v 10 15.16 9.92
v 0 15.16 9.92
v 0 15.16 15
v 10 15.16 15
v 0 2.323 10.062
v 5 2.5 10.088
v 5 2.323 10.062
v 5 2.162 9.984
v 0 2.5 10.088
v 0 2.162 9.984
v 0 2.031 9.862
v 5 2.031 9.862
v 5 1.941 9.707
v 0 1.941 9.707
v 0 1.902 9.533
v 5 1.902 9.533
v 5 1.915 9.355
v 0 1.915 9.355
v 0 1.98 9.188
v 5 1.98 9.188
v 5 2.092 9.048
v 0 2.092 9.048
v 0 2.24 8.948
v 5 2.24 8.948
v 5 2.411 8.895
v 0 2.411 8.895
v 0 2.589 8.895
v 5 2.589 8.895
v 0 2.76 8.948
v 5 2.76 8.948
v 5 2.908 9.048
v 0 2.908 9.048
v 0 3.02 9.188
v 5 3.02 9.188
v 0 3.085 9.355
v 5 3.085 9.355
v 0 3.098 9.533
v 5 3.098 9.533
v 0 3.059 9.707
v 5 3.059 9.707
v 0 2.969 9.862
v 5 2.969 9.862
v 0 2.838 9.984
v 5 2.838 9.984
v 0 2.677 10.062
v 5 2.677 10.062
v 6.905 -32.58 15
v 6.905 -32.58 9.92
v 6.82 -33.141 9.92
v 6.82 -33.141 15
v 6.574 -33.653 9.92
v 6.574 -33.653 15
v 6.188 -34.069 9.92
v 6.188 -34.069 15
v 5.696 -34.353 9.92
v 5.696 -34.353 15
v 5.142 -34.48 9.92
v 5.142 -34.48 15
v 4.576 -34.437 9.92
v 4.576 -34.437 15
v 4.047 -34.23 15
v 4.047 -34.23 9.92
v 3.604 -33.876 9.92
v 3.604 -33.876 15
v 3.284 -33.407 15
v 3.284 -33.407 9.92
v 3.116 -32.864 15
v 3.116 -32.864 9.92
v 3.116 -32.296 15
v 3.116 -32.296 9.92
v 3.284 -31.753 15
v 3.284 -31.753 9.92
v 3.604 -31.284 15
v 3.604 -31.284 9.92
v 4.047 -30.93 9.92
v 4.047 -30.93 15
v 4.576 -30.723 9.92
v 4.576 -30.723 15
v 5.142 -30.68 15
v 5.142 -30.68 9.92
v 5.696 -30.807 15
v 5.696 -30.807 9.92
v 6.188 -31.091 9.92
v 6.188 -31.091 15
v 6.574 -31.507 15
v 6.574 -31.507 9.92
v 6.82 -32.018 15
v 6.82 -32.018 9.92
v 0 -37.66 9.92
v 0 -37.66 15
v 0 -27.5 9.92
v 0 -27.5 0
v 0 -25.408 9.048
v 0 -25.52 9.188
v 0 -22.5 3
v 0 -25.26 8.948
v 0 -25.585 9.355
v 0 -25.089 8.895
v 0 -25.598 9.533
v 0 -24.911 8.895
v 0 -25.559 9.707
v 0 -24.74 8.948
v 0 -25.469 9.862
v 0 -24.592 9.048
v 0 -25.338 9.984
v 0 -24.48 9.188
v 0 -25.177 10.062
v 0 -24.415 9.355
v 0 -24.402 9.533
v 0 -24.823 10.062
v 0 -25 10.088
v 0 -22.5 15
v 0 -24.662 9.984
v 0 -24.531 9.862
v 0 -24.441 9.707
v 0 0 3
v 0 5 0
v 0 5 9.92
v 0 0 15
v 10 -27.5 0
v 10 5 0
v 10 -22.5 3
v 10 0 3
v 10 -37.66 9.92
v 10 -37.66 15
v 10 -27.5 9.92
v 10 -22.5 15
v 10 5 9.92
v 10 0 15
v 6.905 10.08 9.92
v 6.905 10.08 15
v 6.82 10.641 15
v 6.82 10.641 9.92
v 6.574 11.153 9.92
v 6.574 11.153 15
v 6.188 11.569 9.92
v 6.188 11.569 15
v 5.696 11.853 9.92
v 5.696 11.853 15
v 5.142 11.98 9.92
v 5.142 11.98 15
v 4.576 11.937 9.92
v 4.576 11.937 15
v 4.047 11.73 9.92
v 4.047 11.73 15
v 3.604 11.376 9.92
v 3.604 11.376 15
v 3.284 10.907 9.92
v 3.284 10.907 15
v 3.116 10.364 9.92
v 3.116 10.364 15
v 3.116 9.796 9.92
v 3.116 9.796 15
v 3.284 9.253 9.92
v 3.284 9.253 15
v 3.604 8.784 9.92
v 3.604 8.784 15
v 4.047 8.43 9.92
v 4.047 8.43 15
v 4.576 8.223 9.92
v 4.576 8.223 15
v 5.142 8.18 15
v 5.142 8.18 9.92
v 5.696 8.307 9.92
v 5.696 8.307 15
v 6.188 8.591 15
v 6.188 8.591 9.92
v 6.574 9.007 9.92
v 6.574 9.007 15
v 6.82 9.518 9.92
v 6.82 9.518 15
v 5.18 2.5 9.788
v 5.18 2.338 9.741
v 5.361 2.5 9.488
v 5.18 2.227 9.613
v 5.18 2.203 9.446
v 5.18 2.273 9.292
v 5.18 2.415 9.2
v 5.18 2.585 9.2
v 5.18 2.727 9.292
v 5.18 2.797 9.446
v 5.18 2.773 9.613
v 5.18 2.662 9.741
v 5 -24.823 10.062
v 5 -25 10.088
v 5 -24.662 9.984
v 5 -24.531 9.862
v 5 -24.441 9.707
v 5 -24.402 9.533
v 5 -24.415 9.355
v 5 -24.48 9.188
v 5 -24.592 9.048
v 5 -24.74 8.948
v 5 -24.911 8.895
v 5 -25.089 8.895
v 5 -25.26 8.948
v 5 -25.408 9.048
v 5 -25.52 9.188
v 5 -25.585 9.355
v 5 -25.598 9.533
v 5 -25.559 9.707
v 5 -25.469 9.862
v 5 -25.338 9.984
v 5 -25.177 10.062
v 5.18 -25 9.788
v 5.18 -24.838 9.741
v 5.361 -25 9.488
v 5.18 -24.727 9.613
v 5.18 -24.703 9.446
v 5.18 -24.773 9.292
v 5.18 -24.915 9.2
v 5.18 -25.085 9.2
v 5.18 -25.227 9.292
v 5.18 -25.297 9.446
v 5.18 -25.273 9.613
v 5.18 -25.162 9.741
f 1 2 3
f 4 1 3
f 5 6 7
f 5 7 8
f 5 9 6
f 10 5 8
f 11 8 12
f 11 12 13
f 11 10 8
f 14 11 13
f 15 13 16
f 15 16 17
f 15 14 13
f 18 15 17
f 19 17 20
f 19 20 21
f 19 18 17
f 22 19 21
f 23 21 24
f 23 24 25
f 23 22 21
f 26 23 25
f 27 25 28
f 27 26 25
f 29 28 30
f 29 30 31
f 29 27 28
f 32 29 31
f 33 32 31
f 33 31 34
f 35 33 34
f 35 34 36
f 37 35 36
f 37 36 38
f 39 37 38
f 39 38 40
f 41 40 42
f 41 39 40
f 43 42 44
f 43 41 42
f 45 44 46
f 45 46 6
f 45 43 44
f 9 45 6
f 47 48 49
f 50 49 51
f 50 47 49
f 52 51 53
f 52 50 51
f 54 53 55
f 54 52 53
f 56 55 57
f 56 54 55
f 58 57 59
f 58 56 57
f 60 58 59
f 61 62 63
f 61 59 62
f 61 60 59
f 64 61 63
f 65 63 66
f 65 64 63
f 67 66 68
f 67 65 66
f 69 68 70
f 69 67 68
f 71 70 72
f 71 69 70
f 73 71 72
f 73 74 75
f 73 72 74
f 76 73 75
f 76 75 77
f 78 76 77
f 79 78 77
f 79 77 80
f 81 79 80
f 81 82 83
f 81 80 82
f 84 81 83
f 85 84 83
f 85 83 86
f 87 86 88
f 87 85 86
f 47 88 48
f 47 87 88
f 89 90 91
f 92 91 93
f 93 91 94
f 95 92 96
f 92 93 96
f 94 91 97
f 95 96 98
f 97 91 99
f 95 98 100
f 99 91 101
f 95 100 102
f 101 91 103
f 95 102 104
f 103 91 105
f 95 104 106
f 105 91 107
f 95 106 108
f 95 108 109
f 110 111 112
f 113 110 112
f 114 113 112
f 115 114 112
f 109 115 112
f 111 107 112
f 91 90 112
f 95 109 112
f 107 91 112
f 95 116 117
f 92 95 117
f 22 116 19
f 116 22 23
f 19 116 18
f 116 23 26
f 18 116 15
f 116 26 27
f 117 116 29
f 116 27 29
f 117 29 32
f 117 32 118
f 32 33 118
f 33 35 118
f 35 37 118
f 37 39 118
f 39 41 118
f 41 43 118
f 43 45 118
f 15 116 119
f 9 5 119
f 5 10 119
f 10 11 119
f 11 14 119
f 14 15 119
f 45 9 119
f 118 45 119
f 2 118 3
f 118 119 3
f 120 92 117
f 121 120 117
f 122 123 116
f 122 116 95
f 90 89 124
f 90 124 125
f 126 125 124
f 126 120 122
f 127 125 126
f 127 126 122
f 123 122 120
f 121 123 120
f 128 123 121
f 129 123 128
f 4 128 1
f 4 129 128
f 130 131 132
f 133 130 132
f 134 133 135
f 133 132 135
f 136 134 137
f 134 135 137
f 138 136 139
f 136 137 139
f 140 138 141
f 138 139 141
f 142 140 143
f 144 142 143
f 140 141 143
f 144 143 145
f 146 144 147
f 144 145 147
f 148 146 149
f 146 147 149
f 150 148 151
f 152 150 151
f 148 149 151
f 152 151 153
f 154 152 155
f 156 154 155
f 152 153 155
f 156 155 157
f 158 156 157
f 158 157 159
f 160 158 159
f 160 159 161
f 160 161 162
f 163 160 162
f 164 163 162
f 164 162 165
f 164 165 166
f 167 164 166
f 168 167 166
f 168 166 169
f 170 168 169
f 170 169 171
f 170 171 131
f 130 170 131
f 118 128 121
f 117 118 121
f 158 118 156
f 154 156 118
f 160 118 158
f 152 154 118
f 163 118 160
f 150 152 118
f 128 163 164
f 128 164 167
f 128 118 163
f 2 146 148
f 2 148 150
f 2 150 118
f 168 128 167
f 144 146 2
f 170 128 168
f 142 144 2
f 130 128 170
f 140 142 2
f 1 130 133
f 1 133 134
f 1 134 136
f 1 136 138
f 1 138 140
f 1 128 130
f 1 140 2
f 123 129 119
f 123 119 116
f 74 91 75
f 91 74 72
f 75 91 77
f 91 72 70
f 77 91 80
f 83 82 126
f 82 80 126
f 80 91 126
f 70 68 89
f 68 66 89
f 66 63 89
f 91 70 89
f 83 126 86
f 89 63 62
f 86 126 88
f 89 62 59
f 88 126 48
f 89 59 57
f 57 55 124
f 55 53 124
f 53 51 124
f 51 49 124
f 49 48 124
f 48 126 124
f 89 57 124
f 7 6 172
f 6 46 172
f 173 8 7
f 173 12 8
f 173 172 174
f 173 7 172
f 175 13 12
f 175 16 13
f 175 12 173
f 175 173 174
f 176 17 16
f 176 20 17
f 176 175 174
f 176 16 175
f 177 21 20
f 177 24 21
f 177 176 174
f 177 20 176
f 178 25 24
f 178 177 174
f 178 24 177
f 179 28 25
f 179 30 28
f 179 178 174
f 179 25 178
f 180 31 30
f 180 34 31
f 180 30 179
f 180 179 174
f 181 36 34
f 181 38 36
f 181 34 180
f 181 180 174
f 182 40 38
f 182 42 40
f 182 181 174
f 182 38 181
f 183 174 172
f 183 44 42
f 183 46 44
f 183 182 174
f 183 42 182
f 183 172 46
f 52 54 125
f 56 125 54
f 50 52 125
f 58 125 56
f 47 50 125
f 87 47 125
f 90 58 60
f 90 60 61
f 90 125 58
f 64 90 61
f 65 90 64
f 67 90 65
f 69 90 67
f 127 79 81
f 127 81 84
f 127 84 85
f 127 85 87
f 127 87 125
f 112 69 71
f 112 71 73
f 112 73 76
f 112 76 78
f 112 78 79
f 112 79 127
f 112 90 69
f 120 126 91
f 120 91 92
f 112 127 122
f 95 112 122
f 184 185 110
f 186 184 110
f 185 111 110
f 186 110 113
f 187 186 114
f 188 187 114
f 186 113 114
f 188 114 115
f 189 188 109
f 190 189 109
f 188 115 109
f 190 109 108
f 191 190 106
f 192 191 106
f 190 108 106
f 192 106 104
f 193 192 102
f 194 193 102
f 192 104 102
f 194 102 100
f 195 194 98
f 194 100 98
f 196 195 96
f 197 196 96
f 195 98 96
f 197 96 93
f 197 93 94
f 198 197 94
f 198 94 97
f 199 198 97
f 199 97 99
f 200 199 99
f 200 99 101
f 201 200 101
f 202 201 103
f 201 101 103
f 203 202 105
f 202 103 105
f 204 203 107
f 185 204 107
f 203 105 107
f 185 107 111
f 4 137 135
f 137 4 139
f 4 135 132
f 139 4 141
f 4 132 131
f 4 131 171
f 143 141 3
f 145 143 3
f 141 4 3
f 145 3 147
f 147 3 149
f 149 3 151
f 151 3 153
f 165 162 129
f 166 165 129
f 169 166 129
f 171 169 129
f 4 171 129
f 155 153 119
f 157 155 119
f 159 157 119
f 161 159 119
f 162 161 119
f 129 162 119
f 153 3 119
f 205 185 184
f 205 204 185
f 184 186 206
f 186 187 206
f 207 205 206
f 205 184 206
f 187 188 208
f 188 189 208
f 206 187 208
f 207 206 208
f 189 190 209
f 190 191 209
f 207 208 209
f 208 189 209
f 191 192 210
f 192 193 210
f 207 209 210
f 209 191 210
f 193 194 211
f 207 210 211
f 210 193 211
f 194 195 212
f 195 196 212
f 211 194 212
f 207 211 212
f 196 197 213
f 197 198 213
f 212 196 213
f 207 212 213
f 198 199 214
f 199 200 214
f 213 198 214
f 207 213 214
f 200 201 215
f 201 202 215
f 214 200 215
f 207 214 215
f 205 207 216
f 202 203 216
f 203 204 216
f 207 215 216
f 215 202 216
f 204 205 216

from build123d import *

# Parameters (mm, degrees)
SKETCH1_W                  = 26.40999036
SKETCH1_H                  = 14.9999954
BOSS_EXTRUDE1_DEPTH        = 10.0000054
SKETCH2_W                  = 12.0000014
SKETCH2_H                  = 11.25000036
CUT_EXTRUDE1_DEPTH         = 11.0000054
SKETCH3_W                  = 9.9199954
SKETCH3_H                  = 10.16
CUT_EXTRUDE2_DEPTH         = 11.0000054
M3_5_CLEARANCE_HOLE1_D     = 3.81
M3_5_CLEARANCE_HOLE1_DEPTH = 5.08


with BuildPart() as part:
    # Sketch1 → Boss-Extrude1 (new body)
    with BuildSketch(Plane(origin=(0, 0, 0), x_dir=(0, -1, 0), z_dir=(-1, 0, 0))):
        with Locations((-1.95499482, 7.4999977)):
            Rectangle(SKETCH1_W, SKETCH1_H)
    boss_extrude1 = extrude(amount=-BOSS_EXTRUDE1_DEPTH)

    # Sketch2 → Cut-Extrude1 (cut, through all)
    with BuildSketch(Plane(origin=(10.0000054, 0, 0), x_dir=(0, 0, -1), z_dir=(1, 0, 0))):
        with Locations((-8.9999947, -5.62500018)):
            Rectangle(SKETCH2_W, SKETCH2_H)
    cut_extrude1 = extrude(amount=-CUT_EXTRUDE1_DEPTH, mode=Mode.SUBTRACT)

    # Sketch3 → Cut-Extrude2 (cut, through all)
    with BuildSketch(Plane(origin=(10.0000054, 0, 0), x_dir=(0, 0, -1), z_dir=(1, 0, 0))):
        with Locations((-4.9599977, 10.07999)):
            Rectangle(SKETCH3_W, SKETCH3_H)
    cut_extrude2 = extrude(amount=-CUT_EXTRUDE2_DEPTH, mode=Mode.SUBTRACT)

    # M3.5 Clearance Hole1
    with Locations(Plane(origin=(0, 0, 9.9199954), x_dir=(-1, 0, 0), z_dir=(0, 0, -1))):
        with Locations((-4.99999, 10.07999)):
            m3_5_clearance_hole1 = Hole(M3_5_CLEARANCE_HOLE1_D / 2, depth=M3_5_CLEARANCE_HOLE1_DEPTH)

    # Sketch6 → Ø1.2 (1.2) Diameter Hole1 (revolve, cut)
    with BuildSketch(Plane(origin=(0, 2.50000008, 9.4881954), x_dir=(0, 0, 1), z_dir=(0, 1, 0))):
        Polygon((0, 0), (0, 5.360506413), (0.60000007, 4.99999), (0.60000007, 0), align=None)
    f_1_2_1_2_diameter_hole1 = revolve(axis=Axis((-6.35, 2.50000008, 9.4881954), (1, 0, 0)), mode=Mode.SUBTRACT)

    # Mirror1: Boss-Extrude1, Cut-Extrude1, Cut-Extrude2, M3.5 Clearance Hole1, Ø1.2 (1.2) Diameter Hole1 across plane
    add(boss_extrude1.mirror(Plane(origin=(0, -11.25000036, 0), x_dir=(0, 0, 1), z_dir=(0, -1, 0))))
    add(cut_extrude1.mirror(Plane(origin=(0, -11.25000036, 0), x_dir=(0, 0, 1), z_dir=(0, -1, 0))), mode=Mode.SUBTRACT)
    add(cut_extrude2.mirror(Plane(origin=(0, -11.25000036, 0), x_dir=(0, 0, 1), z_dir=(0, -1, 0))), mode=Mode.SUBTRACT)
    add(m3_5_clearance_hole1.mirror(Plane(origin=(0, -11.25000036, 0), x_dir=(0, 0, 1), z_dir=(0, -1, 0))), mode=Mode.SUBTRACT)
    add(f_1_2_1_2_diameter_hole1.mirror(Plane(origin=(0, -11.25000036, 0), x_dir=(0, 0, 1), z_dir=(0, -1, 0))), mode=Mode.SUBTRACT)


solid = part.part
